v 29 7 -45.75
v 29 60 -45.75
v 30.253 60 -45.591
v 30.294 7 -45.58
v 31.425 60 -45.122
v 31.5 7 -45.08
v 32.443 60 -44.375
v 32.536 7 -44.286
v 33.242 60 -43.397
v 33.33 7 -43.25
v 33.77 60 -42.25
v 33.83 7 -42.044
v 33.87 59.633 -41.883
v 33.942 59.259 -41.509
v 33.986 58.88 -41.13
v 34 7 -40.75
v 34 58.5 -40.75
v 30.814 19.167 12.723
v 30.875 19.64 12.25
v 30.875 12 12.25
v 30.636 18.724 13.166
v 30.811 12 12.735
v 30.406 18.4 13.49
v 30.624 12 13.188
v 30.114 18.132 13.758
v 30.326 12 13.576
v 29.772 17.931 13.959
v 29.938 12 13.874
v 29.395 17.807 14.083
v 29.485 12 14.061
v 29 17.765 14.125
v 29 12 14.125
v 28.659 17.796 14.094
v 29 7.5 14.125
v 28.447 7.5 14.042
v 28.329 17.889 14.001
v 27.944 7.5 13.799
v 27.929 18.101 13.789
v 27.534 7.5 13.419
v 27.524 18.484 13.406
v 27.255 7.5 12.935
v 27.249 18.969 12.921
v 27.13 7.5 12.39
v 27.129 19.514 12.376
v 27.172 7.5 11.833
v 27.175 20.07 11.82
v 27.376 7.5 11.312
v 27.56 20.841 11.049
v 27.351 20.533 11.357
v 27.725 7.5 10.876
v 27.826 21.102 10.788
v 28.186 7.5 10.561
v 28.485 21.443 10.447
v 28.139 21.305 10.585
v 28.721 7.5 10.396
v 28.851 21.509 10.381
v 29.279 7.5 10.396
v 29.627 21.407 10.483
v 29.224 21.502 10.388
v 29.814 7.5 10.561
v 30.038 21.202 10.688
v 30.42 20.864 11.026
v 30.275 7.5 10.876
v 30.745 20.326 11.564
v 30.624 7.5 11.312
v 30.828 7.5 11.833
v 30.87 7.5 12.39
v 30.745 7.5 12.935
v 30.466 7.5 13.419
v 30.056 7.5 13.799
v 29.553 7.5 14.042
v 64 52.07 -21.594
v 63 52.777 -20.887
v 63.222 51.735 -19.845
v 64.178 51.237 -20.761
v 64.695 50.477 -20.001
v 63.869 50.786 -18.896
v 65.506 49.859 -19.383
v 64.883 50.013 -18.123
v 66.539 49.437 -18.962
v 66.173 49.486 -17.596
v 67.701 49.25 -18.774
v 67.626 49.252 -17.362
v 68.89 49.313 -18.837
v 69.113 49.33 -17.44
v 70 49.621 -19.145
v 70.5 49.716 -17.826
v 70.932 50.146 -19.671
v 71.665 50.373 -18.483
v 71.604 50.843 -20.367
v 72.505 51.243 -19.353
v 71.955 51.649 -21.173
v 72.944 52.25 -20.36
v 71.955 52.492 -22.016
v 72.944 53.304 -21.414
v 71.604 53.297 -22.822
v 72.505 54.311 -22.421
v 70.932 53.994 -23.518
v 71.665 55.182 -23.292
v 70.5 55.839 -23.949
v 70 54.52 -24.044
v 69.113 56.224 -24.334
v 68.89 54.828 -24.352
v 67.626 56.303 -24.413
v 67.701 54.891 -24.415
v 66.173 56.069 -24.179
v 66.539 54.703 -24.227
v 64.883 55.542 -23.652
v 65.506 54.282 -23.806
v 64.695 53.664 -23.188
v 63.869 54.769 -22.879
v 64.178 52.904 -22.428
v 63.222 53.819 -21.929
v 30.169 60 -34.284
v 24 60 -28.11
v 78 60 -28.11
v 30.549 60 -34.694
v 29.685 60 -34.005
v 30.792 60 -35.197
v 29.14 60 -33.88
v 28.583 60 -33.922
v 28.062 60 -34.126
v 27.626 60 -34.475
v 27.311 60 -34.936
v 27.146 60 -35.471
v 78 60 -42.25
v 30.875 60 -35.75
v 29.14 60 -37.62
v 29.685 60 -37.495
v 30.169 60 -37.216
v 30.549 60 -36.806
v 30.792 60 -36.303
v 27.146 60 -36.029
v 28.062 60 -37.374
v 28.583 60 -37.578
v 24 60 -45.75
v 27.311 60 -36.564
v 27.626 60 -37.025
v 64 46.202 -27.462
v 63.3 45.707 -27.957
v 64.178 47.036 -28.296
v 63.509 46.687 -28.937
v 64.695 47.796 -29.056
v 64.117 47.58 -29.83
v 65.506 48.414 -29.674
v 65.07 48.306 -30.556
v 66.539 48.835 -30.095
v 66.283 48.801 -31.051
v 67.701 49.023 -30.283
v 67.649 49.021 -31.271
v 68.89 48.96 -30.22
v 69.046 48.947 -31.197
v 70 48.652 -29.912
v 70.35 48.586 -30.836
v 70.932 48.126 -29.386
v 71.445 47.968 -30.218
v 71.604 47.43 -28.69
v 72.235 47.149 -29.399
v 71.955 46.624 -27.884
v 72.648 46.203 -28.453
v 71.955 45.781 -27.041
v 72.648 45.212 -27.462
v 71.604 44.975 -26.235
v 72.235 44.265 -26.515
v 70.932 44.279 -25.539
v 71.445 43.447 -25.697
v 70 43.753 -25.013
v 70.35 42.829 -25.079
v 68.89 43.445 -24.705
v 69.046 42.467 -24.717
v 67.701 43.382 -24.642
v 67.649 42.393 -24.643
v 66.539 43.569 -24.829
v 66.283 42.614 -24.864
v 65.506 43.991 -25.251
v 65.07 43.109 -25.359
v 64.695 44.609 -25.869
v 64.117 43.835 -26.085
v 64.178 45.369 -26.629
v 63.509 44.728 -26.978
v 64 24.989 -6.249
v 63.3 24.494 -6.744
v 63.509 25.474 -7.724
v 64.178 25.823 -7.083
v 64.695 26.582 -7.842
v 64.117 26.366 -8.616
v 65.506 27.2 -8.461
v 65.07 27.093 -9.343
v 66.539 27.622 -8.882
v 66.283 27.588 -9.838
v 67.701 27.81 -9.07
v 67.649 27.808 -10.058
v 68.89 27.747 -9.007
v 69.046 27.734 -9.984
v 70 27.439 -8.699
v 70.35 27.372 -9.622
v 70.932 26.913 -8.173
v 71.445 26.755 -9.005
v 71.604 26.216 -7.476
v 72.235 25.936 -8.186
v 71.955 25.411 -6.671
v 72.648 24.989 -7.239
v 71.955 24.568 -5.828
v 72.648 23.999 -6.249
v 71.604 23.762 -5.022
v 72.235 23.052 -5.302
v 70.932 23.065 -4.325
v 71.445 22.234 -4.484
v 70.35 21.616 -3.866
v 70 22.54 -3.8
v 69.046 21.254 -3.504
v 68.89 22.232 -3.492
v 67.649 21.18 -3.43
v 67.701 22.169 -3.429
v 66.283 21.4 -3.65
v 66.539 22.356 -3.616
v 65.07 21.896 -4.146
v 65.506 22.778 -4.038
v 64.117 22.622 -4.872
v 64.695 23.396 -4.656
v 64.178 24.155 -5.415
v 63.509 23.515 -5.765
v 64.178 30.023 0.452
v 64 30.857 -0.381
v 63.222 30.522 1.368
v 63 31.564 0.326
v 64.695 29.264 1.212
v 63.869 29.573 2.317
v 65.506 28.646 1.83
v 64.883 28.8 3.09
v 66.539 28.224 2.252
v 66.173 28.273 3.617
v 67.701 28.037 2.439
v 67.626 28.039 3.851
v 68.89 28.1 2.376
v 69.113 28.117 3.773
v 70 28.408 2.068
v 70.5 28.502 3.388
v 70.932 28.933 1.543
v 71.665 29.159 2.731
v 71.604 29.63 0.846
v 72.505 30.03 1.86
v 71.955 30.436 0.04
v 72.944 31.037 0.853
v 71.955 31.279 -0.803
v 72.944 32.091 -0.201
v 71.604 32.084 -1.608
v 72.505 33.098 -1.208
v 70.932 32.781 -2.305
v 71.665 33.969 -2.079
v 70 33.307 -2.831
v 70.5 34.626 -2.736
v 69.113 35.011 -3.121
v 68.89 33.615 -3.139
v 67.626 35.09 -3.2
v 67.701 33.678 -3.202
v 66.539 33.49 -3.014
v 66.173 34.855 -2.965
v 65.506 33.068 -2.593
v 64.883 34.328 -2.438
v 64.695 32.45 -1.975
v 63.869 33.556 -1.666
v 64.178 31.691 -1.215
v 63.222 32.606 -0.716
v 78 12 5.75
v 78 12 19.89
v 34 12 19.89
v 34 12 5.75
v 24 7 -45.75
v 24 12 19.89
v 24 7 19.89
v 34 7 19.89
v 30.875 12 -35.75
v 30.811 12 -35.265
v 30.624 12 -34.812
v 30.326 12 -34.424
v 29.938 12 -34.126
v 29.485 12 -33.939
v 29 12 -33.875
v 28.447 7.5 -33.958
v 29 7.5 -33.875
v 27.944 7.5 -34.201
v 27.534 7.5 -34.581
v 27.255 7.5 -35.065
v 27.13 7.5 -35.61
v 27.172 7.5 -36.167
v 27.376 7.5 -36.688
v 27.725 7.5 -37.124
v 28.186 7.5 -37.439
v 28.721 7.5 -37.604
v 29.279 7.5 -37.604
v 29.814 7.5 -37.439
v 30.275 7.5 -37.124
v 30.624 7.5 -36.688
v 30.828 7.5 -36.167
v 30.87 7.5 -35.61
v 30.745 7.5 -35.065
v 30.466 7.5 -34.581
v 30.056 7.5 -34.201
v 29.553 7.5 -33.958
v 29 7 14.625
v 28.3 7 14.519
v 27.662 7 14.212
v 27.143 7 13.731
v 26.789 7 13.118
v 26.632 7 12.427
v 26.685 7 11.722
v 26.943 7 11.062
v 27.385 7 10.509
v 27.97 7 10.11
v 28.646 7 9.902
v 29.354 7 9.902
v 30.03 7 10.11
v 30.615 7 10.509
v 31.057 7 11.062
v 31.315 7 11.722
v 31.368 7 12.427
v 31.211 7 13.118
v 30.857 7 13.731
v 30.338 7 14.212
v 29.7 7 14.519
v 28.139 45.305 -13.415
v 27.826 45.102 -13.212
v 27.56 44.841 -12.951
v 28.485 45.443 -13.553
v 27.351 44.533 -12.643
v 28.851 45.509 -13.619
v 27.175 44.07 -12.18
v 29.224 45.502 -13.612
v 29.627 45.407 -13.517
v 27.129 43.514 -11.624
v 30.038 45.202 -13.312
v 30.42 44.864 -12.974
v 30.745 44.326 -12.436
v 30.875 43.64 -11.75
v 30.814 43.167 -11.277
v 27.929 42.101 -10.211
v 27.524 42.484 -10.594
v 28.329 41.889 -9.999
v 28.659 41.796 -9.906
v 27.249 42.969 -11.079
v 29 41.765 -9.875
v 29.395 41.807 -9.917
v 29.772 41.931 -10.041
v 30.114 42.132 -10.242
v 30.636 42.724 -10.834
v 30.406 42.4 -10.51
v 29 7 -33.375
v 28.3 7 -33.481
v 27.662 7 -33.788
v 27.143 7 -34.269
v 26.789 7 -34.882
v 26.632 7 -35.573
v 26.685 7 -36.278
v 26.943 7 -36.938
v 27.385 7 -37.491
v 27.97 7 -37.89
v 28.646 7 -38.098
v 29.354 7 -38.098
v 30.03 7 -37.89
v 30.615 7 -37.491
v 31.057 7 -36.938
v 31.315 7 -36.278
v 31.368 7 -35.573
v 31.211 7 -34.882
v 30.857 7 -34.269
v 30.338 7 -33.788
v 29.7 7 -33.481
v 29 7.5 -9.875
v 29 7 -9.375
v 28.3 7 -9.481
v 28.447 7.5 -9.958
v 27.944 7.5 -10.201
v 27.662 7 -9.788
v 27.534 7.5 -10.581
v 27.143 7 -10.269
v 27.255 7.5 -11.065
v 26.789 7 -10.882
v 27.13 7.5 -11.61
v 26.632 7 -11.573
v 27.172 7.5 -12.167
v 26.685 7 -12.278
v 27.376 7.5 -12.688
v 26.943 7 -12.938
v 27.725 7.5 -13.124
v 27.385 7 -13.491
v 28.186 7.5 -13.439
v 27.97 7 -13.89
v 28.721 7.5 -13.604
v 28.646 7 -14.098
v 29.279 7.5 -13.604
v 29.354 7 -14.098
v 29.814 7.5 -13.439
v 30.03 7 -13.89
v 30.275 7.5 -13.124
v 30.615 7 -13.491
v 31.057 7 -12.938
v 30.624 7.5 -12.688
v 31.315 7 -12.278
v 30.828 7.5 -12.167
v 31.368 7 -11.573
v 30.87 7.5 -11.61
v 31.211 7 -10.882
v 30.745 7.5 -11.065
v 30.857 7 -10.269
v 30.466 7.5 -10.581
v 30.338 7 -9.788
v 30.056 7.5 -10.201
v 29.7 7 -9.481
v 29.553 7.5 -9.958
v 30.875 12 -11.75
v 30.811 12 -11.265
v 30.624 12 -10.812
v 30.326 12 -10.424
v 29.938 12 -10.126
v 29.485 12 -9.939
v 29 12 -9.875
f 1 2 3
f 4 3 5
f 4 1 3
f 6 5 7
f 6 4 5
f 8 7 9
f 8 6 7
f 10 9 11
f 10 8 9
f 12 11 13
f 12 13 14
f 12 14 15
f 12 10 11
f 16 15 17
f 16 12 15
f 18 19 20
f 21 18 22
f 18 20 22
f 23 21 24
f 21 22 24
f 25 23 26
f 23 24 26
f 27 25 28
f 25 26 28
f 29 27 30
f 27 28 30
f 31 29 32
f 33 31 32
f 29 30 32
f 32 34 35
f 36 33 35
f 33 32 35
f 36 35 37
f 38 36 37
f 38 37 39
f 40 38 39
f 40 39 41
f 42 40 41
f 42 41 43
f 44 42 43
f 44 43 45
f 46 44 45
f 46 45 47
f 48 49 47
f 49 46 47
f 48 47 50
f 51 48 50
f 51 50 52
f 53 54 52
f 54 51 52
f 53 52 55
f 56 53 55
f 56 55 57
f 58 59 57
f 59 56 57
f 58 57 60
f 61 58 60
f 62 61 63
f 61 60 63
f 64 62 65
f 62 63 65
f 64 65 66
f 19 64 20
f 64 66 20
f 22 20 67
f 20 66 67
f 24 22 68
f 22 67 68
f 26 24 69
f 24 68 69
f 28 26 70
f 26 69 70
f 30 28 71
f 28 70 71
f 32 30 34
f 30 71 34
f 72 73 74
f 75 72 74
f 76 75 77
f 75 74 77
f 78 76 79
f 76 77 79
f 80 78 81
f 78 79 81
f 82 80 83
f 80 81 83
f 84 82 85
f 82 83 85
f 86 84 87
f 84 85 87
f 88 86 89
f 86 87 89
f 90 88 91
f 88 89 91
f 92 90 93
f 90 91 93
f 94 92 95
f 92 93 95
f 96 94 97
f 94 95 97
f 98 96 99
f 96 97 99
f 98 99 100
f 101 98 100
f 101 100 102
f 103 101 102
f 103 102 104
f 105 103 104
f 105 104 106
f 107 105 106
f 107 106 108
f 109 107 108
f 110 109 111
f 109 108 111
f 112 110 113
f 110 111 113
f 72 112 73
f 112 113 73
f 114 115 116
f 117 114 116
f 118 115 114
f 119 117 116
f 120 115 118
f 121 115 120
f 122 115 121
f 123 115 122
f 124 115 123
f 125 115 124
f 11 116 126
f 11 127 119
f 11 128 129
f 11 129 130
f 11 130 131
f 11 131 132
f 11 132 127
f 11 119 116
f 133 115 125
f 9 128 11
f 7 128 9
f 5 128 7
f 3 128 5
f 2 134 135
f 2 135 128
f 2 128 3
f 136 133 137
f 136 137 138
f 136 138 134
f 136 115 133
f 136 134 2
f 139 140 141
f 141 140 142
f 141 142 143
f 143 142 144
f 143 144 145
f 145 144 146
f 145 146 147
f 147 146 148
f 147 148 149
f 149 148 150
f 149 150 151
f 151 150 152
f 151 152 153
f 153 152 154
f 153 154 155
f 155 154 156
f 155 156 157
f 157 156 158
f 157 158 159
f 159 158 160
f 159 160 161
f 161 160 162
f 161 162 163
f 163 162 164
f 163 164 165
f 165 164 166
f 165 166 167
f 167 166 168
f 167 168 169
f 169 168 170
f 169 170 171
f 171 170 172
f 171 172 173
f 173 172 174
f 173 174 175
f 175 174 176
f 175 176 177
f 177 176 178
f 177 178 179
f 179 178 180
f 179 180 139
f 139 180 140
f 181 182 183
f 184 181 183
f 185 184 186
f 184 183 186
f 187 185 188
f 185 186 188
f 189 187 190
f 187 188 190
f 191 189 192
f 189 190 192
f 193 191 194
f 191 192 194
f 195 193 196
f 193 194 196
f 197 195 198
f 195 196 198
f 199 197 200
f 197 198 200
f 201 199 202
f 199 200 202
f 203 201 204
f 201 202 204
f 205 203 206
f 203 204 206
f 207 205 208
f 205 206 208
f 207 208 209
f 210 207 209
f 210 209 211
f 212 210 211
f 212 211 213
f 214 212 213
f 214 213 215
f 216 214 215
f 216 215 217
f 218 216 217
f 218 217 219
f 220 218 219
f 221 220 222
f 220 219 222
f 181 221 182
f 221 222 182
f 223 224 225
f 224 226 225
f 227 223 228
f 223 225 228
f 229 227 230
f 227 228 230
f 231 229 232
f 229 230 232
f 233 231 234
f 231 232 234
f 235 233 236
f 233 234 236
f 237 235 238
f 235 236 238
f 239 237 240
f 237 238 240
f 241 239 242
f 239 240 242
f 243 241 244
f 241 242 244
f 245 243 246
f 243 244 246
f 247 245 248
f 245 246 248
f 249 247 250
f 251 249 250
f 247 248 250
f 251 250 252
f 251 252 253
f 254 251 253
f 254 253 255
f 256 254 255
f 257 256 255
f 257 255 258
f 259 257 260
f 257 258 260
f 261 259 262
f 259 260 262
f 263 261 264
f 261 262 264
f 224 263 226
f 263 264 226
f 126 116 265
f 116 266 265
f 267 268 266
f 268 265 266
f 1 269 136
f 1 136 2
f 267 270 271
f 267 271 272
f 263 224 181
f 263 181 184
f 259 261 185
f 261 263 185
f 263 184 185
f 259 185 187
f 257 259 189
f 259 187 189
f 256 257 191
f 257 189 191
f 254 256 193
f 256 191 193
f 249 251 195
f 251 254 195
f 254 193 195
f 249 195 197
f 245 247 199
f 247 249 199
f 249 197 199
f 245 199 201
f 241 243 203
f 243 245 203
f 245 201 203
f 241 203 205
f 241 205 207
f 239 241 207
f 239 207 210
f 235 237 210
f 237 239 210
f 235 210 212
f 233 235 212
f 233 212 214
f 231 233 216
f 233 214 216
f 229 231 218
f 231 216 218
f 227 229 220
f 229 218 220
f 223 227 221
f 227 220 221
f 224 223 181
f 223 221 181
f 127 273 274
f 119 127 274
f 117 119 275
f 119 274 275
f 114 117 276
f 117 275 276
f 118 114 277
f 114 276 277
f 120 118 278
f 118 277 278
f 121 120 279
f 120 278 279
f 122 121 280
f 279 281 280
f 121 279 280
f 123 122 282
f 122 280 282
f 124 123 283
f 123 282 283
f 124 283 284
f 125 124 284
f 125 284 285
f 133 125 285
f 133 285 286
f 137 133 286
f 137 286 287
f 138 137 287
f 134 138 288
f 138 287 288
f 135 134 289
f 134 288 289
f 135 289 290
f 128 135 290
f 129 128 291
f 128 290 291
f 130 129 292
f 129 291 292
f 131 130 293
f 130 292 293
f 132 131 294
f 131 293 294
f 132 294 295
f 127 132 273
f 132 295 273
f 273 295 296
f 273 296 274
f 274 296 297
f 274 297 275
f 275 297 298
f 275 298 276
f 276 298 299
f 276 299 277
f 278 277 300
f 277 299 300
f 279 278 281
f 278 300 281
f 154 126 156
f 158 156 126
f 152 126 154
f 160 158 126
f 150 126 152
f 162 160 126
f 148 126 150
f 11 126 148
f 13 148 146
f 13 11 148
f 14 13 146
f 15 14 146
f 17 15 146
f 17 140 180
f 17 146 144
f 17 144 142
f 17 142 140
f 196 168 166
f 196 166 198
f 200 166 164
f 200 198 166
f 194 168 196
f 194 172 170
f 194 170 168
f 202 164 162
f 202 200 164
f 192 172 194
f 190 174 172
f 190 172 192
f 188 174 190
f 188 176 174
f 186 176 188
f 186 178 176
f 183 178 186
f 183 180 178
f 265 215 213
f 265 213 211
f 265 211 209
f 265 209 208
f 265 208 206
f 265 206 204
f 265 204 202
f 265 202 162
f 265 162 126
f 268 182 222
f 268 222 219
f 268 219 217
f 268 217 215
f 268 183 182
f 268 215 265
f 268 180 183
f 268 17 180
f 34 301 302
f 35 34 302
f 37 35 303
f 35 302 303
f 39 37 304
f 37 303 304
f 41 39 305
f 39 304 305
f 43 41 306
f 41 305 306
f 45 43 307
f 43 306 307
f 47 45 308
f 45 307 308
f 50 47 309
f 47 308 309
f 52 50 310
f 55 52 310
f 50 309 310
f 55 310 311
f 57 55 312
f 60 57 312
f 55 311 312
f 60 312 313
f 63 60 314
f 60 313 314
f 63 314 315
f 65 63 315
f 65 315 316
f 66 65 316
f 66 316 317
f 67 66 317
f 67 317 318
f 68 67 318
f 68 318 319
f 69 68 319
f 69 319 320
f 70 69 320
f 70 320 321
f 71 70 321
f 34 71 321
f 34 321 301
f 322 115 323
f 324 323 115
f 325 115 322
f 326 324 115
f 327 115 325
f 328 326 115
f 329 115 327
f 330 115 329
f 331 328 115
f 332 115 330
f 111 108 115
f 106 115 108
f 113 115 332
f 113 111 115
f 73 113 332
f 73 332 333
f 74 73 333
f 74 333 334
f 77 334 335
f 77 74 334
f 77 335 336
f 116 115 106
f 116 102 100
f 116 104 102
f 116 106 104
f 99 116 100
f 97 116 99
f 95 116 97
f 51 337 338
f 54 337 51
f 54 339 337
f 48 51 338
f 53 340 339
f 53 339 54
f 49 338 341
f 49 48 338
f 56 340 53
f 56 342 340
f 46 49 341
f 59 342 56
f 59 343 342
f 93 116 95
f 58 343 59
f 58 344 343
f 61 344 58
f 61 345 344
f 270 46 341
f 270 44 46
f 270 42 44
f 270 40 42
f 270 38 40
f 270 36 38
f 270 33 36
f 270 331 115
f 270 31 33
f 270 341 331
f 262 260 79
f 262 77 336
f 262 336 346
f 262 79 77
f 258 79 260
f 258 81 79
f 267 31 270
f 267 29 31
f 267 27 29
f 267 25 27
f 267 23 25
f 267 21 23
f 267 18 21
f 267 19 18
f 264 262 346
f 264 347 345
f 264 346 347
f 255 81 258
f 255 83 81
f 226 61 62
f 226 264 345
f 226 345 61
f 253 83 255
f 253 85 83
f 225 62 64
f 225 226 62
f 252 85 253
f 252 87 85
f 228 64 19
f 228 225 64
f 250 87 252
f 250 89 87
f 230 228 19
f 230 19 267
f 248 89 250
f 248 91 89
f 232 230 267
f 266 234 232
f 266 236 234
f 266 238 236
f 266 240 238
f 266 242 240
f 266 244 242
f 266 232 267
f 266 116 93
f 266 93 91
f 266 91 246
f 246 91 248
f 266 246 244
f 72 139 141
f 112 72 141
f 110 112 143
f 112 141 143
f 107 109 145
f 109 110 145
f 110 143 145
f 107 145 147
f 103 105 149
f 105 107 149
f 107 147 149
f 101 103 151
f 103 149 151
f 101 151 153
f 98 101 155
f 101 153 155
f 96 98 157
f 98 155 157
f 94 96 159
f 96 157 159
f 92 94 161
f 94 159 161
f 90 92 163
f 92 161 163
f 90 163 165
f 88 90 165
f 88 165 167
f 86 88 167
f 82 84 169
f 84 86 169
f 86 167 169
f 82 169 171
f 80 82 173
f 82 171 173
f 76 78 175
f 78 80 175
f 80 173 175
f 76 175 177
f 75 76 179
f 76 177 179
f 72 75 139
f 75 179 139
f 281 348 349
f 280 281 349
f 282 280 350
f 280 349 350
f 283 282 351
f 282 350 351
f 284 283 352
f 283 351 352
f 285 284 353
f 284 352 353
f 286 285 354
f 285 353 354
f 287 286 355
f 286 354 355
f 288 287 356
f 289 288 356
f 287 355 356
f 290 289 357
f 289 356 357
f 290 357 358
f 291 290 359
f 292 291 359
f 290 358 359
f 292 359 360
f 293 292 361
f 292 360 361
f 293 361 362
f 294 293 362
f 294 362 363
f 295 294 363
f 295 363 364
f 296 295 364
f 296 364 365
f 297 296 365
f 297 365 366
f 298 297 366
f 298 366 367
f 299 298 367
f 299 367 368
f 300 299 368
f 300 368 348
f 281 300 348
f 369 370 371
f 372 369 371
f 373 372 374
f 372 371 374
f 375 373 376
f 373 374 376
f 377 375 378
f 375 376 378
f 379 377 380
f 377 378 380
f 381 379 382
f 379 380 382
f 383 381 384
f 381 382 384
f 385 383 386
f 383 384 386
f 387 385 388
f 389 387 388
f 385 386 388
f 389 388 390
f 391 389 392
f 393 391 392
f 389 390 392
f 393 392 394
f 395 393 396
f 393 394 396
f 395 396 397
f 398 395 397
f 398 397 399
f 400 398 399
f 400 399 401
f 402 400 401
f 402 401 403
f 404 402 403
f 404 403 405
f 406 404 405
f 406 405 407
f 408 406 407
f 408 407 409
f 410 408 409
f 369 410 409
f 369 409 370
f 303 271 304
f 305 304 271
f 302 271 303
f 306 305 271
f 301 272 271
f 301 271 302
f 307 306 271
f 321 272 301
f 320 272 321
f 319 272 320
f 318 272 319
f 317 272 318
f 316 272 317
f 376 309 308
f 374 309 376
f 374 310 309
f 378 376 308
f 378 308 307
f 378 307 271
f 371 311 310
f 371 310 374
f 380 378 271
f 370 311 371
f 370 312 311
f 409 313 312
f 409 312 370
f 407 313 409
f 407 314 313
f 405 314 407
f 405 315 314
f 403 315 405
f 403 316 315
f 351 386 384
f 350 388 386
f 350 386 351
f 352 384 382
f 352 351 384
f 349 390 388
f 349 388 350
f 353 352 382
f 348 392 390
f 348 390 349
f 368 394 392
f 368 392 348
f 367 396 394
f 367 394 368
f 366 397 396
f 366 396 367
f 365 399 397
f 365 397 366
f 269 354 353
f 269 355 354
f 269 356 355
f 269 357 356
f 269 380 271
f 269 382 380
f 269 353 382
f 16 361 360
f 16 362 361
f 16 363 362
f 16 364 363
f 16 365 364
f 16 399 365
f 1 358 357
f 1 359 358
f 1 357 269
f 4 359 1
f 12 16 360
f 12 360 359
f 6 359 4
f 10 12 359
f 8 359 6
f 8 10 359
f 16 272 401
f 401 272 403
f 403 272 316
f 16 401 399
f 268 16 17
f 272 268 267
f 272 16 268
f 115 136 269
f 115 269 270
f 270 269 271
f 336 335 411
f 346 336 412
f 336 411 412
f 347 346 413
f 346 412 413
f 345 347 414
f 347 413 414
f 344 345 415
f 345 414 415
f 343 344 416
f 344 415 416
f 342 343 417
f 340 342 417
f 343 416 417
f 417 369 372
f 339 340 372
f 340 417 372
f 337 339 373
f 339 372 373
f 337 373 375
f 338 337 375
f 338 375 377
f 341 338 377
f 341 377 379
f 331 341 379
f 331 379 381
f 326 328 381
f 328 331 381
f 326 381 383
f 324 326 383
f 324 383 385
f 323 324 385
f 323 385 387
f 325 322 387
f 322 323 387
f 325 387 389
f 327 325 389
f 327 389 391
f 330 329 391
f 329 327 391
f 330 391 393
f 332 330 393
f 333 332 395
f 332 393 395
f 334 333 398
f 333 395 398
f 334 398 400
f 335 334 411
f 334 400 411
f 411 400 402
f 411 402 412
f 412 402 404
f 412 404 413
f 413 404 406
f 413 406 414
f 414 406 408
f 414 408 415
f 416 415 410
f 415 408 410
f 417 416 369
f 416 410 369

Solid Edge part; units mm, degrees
sketch "Sketch1" plane through (0, 0, 0) normal (0, -1, 0) x (1, 0, 0)
  line L0 (-34, -45.75) -> (34, -45.75)
  line L1 (34, -45.75) -> (34, 45.75)
  line L2 (34, 45.75) -> (-34, 45.75)
  line L3 (-34, 45.75) -> (-34, -45.75)
  dimension "D1" = 68
  dimension "D2" = 91.5
extrude "Protrusion1" add sketch "Sketch1" against normal blind 12
sketch "Sketch2" plane through (0, 0, 0) normal (0, -1, 0) x (1, 0, 0)
  circle A0 centre (0, -14.75) radius 11.25
  circle A1 centre (-15.5, 0.75) radius 1.7
  circle A2 centre (-15.5, -30.25) radius 1.7
  circle A3 centre (15.5, -30.25) radius 1.7
  circle A4 centre (15.5, 0.75) radius 1.7
  dimension "D1" = 22.5
  dimension "D2" = 3.4
  dimension "D3" = 31
  dimension "D4" = 31
extrude "Cutout1" cut sketch "Sketch2" against normal through all
sketch "Sketch3" plane through (0, 0, 0) normal (0, -1, 0) x (1, 0, 0)
  circle A0 centre (7.7782, 36.0282) radius 1.4
  circle A1 centre (7.7782, 20.4718) radius 1.4
  circle A2 centre (-7.7782, 20.4718) radius 1.4
  circle A3 centre (-7.7782, 36.0282) radius 1.4
  circle A4 centre (0, 28.25) radius 6
  dimension "D1" = 7.7782
extrude "Cutout2" cut sketch "Sketch3" against normal through all
sketch "Sketch4" plane through (-34, 6, 0) normal (-1, 0, 0) x (0, 0, -1)
  line L0 (-19.89, -6) -> (45.75, -71.64)
  line L1 (45.75, -71.64) -> (45.75, -6)
  line L2 (45.75, -6) -> (-19.89, -6)
  dimension "D1" = 25.86
extrude "Extrusionsausprägung_2" add sketch "Sketch4" against normal blind 10
mirror "Mirror1" about plane through (0, 0, 0) normal (1, 0, 0) of "Extrusionsausprägung_2"
sketch "Sketch5" plane through (-34, 38.82, 0) normal (-1, 0, 0) x (0, 0, -1)
  circle A0 centre (33.7465, 1.4635) radius 1.875
  circle A1 centre (19.6043, 15.6057) radius 1.875
  dimension "D1" = 3.75
  dimension "D2" = 20
  dimension "D3" = 42.14
  dimension "D4" = 32.83
extrude "Extrusionsausschnitt_3" cut sketch "Sketch5" against normal blind 14
sketch "Sketch6" plane through (-34, 38.82, 0) normal (-1, 0, 0) x (0, 0, -1)
  line L0 (45.75, -38.82) -> (-31.89, 38.82)
  line L1 (-31.89, 38.82) -> (-17.75, 38.82)
  line L2 (-17.75, 38.82) -> (45.75, -24.68)
  line L3 (45.75, -24.68) -> (45.75, -38.82)
  dimension "D1" = 14.14
extrude "Extrusionsausprägung_4" add sketch "Sketch6" along normal blind 44
mirror "Mirror2" about plane through (0, 0, 0) normal (1, 0, 0) of "Extrusionsausprägung_4"
sketch "Sketch7" plane through (-54, 31.75, -14) normal (0, -0.7071, -0.7071) x (1, 0, 0)
  circle A0 centre (-14, 10.2613) radius 4
  circle A1 centre (-14, -19.7387) radius 4
  dimension "D1" = 8
  dimension "D2" = 34.64
  dimension "D3" = 30
  dimension "D4" = 10
extrude "Cutout3" cut sketch "Sketch7" against normal up to next
mirror "Mirror3" about plane through (0, 0, 0) normal (1, 0, 0) of "Cutout3"
sketch "Sketch8" plane through (-78, 38.82, -6.93) normal (-1, 0, 0) x (0, 0.7071, -0.7071)
  line L0 (29.953, 0) -> (42.4264, 12.4734)
  dimension "D1" = 60
extrude "Cutout4" cut sketch "Sketch8" against normal through all material side at (-78, 60.05, -36.93)
sketch "Sketch9" plane through (78, 30, -5.18) normal (1, 0, 0) x (0, -0.7071, 0.7071)
  line L0 (30.4551, -4.9992) -> (47.4257, -4.9992)
  line L1 (47.4257, -4.9992) -> (57.2262, -14.7997)
  line L2 (57.2262, -14.7997) -> (48.7409, -23.285)
  line L3 (48.7409, -23.285) -> (30.4551, -4.9992)
extrude "Extrusionsausschnitt_6" cut sketch "Sketch9" against normal blind 55
mirror "Mirror4" about plane through (0, 0, 0) normal (1, 0, 0) of "Extrusionsausschnitt_6"
fillet "Verrundung_1" radius 5 4 edges at (23, 6, 45.75) (-23, 6, 45.75) (34, 30, -45.75) (-34, 30, -45.75)
chamfer "Fase_1" distance 0.5 angle 45 2 edges at (-34, 23.2143, -17.7293) (-34, 37.3565, -31.8715)
chamfer "Fase_2" distance 0.4 angle 45 4 edges at (-17.2, 0, -30.25) (-17.2, 0, 0.75) (13.8, 0, 0.75) (13.8, 0, -30.25)
chamfer "Fase_3" distance 0.4 angle 45 4 edges at (-9.1782, 0, 20.4718) (-9.1782, 0, 36.0282) (6.3782, 0, 36.0282) (6.3782, 0, 20.4718)
chamfer "Fase_4" distance 2.5 angle 45 2 edges at (-11.25, 0, -14.75) (0, 12, -3.5)
chamfer "Fase_5" distance 1.4 angle 45 2 edges at (-6, 0, 28.25) (0, 12, 34.25)
chamfer "Fase_7" distance 1 angle 45 4 edges at (-68, 34.3926, -2.5026) (-68, 55.6058, -23.7158) (68, 34.3926, -2.5026) (68, 55.6058, -23.7158)
sketch "Sketch10" plane through (-78, 30, -5.18) normal (-1, 0, 0) x (0, 0.7071, -0.7071)
  line L0 (-30.4551, -4.9992) -> (-20.4566, 4.9992)
extrude "Extrusionsausschnitt_8" cut sketch "Sketch10" against normal blind 44 material side at (-78, 11.95, 12.82)
mirror "Mirror5" about plane through (0, 0, 0) normal (1, 0, 0) of "Extrusionsausschnitt_8"
sketch "Sketch11" plane through (0, 30, -45.75) normal (0, 0, -1) x (1, 0, 0)
  line L0 (34, 18) -> (-24, 18)
  line L1 (-24, 18) -> (-24, -30)
  line L2 (-24, -30) -> (-78, -30)
  line L3 (-78, -30) -> (-78, 30)
  line L4 (-78, 30) -> (34, 30)
  line L5 (34, 30) -> (34, 18)
extrude "Cutout6" cut sketch "Sketch11" against normal through all
sketch "Sketch12" plane through (51, 12, -12.93) normal (0, -1, 0) x (1, 0, 0)
  circle A0 centre (-22, 25.18) radius 1.875
  circle A1 centre (-22, 1.18) radius 1.875
  circle A2 centre (-22, -22.82) radius 1.875
  dimension "D1" = 10
  dimension "D2" = 5
  dimension "D3" = 3.75
  dimension "D4" = 24
  dimension "D5" = 24
extrude "Cutout7" cut sketch "Sketch12" against normal through all
sketch "Sketch13" plane through (51, 12, -12.93) normal (0, -1, 0) x (1, 0, 0)
  arc A0 (-22, -32.82) -> (-17, -27.82) centre (-22, -27.82) ccw
  line L0 (-17, 18.68) -> (-17, -27.82)
  line L1 (-17, 32.82) -> (-17, 18.68)
  line L2 (-27, 32.82) -> (-17, 32.82)
  line L3 (-27, 32.82) -> (-27, -32.82)
  line L4 (-27, -32.82) -> (-22, -32.82)
extrude "Extrusionsausprägung_6" add sketch "Sketch13" along normal blind 5
sketch "Sketch14" plane through (29, 7, -12.93) normal (0, -1, 0) x (0, 0, 1)
  circle A0 centre (25.18, 0) radius 1.875
  circle A1 centre (1.18, 0) radius 1.875
  circle A2 centre (-22.82, 0) radius 1.875
  dimension "D1" = 10
  dimension "D2" = 5
  dimension "D3" = 3.75
  dimension "D4" = 24
  dimension "D5" = 24
extrude "Cutout8" cut sketch "Sketch14" against normal through all
chamfer "Fase_8" distance 0.5 angle 45 3 edges at (29, 7, 10.375) (29, 7, -13.625) (29, 7, -37.625)
chamfer "Fase_9" distance 0.7 angle 45 2 edges at (72, 24.4942, -6.7442) (72, 45.7074, -27.9574)
properties material "Nylon, allgemein"
